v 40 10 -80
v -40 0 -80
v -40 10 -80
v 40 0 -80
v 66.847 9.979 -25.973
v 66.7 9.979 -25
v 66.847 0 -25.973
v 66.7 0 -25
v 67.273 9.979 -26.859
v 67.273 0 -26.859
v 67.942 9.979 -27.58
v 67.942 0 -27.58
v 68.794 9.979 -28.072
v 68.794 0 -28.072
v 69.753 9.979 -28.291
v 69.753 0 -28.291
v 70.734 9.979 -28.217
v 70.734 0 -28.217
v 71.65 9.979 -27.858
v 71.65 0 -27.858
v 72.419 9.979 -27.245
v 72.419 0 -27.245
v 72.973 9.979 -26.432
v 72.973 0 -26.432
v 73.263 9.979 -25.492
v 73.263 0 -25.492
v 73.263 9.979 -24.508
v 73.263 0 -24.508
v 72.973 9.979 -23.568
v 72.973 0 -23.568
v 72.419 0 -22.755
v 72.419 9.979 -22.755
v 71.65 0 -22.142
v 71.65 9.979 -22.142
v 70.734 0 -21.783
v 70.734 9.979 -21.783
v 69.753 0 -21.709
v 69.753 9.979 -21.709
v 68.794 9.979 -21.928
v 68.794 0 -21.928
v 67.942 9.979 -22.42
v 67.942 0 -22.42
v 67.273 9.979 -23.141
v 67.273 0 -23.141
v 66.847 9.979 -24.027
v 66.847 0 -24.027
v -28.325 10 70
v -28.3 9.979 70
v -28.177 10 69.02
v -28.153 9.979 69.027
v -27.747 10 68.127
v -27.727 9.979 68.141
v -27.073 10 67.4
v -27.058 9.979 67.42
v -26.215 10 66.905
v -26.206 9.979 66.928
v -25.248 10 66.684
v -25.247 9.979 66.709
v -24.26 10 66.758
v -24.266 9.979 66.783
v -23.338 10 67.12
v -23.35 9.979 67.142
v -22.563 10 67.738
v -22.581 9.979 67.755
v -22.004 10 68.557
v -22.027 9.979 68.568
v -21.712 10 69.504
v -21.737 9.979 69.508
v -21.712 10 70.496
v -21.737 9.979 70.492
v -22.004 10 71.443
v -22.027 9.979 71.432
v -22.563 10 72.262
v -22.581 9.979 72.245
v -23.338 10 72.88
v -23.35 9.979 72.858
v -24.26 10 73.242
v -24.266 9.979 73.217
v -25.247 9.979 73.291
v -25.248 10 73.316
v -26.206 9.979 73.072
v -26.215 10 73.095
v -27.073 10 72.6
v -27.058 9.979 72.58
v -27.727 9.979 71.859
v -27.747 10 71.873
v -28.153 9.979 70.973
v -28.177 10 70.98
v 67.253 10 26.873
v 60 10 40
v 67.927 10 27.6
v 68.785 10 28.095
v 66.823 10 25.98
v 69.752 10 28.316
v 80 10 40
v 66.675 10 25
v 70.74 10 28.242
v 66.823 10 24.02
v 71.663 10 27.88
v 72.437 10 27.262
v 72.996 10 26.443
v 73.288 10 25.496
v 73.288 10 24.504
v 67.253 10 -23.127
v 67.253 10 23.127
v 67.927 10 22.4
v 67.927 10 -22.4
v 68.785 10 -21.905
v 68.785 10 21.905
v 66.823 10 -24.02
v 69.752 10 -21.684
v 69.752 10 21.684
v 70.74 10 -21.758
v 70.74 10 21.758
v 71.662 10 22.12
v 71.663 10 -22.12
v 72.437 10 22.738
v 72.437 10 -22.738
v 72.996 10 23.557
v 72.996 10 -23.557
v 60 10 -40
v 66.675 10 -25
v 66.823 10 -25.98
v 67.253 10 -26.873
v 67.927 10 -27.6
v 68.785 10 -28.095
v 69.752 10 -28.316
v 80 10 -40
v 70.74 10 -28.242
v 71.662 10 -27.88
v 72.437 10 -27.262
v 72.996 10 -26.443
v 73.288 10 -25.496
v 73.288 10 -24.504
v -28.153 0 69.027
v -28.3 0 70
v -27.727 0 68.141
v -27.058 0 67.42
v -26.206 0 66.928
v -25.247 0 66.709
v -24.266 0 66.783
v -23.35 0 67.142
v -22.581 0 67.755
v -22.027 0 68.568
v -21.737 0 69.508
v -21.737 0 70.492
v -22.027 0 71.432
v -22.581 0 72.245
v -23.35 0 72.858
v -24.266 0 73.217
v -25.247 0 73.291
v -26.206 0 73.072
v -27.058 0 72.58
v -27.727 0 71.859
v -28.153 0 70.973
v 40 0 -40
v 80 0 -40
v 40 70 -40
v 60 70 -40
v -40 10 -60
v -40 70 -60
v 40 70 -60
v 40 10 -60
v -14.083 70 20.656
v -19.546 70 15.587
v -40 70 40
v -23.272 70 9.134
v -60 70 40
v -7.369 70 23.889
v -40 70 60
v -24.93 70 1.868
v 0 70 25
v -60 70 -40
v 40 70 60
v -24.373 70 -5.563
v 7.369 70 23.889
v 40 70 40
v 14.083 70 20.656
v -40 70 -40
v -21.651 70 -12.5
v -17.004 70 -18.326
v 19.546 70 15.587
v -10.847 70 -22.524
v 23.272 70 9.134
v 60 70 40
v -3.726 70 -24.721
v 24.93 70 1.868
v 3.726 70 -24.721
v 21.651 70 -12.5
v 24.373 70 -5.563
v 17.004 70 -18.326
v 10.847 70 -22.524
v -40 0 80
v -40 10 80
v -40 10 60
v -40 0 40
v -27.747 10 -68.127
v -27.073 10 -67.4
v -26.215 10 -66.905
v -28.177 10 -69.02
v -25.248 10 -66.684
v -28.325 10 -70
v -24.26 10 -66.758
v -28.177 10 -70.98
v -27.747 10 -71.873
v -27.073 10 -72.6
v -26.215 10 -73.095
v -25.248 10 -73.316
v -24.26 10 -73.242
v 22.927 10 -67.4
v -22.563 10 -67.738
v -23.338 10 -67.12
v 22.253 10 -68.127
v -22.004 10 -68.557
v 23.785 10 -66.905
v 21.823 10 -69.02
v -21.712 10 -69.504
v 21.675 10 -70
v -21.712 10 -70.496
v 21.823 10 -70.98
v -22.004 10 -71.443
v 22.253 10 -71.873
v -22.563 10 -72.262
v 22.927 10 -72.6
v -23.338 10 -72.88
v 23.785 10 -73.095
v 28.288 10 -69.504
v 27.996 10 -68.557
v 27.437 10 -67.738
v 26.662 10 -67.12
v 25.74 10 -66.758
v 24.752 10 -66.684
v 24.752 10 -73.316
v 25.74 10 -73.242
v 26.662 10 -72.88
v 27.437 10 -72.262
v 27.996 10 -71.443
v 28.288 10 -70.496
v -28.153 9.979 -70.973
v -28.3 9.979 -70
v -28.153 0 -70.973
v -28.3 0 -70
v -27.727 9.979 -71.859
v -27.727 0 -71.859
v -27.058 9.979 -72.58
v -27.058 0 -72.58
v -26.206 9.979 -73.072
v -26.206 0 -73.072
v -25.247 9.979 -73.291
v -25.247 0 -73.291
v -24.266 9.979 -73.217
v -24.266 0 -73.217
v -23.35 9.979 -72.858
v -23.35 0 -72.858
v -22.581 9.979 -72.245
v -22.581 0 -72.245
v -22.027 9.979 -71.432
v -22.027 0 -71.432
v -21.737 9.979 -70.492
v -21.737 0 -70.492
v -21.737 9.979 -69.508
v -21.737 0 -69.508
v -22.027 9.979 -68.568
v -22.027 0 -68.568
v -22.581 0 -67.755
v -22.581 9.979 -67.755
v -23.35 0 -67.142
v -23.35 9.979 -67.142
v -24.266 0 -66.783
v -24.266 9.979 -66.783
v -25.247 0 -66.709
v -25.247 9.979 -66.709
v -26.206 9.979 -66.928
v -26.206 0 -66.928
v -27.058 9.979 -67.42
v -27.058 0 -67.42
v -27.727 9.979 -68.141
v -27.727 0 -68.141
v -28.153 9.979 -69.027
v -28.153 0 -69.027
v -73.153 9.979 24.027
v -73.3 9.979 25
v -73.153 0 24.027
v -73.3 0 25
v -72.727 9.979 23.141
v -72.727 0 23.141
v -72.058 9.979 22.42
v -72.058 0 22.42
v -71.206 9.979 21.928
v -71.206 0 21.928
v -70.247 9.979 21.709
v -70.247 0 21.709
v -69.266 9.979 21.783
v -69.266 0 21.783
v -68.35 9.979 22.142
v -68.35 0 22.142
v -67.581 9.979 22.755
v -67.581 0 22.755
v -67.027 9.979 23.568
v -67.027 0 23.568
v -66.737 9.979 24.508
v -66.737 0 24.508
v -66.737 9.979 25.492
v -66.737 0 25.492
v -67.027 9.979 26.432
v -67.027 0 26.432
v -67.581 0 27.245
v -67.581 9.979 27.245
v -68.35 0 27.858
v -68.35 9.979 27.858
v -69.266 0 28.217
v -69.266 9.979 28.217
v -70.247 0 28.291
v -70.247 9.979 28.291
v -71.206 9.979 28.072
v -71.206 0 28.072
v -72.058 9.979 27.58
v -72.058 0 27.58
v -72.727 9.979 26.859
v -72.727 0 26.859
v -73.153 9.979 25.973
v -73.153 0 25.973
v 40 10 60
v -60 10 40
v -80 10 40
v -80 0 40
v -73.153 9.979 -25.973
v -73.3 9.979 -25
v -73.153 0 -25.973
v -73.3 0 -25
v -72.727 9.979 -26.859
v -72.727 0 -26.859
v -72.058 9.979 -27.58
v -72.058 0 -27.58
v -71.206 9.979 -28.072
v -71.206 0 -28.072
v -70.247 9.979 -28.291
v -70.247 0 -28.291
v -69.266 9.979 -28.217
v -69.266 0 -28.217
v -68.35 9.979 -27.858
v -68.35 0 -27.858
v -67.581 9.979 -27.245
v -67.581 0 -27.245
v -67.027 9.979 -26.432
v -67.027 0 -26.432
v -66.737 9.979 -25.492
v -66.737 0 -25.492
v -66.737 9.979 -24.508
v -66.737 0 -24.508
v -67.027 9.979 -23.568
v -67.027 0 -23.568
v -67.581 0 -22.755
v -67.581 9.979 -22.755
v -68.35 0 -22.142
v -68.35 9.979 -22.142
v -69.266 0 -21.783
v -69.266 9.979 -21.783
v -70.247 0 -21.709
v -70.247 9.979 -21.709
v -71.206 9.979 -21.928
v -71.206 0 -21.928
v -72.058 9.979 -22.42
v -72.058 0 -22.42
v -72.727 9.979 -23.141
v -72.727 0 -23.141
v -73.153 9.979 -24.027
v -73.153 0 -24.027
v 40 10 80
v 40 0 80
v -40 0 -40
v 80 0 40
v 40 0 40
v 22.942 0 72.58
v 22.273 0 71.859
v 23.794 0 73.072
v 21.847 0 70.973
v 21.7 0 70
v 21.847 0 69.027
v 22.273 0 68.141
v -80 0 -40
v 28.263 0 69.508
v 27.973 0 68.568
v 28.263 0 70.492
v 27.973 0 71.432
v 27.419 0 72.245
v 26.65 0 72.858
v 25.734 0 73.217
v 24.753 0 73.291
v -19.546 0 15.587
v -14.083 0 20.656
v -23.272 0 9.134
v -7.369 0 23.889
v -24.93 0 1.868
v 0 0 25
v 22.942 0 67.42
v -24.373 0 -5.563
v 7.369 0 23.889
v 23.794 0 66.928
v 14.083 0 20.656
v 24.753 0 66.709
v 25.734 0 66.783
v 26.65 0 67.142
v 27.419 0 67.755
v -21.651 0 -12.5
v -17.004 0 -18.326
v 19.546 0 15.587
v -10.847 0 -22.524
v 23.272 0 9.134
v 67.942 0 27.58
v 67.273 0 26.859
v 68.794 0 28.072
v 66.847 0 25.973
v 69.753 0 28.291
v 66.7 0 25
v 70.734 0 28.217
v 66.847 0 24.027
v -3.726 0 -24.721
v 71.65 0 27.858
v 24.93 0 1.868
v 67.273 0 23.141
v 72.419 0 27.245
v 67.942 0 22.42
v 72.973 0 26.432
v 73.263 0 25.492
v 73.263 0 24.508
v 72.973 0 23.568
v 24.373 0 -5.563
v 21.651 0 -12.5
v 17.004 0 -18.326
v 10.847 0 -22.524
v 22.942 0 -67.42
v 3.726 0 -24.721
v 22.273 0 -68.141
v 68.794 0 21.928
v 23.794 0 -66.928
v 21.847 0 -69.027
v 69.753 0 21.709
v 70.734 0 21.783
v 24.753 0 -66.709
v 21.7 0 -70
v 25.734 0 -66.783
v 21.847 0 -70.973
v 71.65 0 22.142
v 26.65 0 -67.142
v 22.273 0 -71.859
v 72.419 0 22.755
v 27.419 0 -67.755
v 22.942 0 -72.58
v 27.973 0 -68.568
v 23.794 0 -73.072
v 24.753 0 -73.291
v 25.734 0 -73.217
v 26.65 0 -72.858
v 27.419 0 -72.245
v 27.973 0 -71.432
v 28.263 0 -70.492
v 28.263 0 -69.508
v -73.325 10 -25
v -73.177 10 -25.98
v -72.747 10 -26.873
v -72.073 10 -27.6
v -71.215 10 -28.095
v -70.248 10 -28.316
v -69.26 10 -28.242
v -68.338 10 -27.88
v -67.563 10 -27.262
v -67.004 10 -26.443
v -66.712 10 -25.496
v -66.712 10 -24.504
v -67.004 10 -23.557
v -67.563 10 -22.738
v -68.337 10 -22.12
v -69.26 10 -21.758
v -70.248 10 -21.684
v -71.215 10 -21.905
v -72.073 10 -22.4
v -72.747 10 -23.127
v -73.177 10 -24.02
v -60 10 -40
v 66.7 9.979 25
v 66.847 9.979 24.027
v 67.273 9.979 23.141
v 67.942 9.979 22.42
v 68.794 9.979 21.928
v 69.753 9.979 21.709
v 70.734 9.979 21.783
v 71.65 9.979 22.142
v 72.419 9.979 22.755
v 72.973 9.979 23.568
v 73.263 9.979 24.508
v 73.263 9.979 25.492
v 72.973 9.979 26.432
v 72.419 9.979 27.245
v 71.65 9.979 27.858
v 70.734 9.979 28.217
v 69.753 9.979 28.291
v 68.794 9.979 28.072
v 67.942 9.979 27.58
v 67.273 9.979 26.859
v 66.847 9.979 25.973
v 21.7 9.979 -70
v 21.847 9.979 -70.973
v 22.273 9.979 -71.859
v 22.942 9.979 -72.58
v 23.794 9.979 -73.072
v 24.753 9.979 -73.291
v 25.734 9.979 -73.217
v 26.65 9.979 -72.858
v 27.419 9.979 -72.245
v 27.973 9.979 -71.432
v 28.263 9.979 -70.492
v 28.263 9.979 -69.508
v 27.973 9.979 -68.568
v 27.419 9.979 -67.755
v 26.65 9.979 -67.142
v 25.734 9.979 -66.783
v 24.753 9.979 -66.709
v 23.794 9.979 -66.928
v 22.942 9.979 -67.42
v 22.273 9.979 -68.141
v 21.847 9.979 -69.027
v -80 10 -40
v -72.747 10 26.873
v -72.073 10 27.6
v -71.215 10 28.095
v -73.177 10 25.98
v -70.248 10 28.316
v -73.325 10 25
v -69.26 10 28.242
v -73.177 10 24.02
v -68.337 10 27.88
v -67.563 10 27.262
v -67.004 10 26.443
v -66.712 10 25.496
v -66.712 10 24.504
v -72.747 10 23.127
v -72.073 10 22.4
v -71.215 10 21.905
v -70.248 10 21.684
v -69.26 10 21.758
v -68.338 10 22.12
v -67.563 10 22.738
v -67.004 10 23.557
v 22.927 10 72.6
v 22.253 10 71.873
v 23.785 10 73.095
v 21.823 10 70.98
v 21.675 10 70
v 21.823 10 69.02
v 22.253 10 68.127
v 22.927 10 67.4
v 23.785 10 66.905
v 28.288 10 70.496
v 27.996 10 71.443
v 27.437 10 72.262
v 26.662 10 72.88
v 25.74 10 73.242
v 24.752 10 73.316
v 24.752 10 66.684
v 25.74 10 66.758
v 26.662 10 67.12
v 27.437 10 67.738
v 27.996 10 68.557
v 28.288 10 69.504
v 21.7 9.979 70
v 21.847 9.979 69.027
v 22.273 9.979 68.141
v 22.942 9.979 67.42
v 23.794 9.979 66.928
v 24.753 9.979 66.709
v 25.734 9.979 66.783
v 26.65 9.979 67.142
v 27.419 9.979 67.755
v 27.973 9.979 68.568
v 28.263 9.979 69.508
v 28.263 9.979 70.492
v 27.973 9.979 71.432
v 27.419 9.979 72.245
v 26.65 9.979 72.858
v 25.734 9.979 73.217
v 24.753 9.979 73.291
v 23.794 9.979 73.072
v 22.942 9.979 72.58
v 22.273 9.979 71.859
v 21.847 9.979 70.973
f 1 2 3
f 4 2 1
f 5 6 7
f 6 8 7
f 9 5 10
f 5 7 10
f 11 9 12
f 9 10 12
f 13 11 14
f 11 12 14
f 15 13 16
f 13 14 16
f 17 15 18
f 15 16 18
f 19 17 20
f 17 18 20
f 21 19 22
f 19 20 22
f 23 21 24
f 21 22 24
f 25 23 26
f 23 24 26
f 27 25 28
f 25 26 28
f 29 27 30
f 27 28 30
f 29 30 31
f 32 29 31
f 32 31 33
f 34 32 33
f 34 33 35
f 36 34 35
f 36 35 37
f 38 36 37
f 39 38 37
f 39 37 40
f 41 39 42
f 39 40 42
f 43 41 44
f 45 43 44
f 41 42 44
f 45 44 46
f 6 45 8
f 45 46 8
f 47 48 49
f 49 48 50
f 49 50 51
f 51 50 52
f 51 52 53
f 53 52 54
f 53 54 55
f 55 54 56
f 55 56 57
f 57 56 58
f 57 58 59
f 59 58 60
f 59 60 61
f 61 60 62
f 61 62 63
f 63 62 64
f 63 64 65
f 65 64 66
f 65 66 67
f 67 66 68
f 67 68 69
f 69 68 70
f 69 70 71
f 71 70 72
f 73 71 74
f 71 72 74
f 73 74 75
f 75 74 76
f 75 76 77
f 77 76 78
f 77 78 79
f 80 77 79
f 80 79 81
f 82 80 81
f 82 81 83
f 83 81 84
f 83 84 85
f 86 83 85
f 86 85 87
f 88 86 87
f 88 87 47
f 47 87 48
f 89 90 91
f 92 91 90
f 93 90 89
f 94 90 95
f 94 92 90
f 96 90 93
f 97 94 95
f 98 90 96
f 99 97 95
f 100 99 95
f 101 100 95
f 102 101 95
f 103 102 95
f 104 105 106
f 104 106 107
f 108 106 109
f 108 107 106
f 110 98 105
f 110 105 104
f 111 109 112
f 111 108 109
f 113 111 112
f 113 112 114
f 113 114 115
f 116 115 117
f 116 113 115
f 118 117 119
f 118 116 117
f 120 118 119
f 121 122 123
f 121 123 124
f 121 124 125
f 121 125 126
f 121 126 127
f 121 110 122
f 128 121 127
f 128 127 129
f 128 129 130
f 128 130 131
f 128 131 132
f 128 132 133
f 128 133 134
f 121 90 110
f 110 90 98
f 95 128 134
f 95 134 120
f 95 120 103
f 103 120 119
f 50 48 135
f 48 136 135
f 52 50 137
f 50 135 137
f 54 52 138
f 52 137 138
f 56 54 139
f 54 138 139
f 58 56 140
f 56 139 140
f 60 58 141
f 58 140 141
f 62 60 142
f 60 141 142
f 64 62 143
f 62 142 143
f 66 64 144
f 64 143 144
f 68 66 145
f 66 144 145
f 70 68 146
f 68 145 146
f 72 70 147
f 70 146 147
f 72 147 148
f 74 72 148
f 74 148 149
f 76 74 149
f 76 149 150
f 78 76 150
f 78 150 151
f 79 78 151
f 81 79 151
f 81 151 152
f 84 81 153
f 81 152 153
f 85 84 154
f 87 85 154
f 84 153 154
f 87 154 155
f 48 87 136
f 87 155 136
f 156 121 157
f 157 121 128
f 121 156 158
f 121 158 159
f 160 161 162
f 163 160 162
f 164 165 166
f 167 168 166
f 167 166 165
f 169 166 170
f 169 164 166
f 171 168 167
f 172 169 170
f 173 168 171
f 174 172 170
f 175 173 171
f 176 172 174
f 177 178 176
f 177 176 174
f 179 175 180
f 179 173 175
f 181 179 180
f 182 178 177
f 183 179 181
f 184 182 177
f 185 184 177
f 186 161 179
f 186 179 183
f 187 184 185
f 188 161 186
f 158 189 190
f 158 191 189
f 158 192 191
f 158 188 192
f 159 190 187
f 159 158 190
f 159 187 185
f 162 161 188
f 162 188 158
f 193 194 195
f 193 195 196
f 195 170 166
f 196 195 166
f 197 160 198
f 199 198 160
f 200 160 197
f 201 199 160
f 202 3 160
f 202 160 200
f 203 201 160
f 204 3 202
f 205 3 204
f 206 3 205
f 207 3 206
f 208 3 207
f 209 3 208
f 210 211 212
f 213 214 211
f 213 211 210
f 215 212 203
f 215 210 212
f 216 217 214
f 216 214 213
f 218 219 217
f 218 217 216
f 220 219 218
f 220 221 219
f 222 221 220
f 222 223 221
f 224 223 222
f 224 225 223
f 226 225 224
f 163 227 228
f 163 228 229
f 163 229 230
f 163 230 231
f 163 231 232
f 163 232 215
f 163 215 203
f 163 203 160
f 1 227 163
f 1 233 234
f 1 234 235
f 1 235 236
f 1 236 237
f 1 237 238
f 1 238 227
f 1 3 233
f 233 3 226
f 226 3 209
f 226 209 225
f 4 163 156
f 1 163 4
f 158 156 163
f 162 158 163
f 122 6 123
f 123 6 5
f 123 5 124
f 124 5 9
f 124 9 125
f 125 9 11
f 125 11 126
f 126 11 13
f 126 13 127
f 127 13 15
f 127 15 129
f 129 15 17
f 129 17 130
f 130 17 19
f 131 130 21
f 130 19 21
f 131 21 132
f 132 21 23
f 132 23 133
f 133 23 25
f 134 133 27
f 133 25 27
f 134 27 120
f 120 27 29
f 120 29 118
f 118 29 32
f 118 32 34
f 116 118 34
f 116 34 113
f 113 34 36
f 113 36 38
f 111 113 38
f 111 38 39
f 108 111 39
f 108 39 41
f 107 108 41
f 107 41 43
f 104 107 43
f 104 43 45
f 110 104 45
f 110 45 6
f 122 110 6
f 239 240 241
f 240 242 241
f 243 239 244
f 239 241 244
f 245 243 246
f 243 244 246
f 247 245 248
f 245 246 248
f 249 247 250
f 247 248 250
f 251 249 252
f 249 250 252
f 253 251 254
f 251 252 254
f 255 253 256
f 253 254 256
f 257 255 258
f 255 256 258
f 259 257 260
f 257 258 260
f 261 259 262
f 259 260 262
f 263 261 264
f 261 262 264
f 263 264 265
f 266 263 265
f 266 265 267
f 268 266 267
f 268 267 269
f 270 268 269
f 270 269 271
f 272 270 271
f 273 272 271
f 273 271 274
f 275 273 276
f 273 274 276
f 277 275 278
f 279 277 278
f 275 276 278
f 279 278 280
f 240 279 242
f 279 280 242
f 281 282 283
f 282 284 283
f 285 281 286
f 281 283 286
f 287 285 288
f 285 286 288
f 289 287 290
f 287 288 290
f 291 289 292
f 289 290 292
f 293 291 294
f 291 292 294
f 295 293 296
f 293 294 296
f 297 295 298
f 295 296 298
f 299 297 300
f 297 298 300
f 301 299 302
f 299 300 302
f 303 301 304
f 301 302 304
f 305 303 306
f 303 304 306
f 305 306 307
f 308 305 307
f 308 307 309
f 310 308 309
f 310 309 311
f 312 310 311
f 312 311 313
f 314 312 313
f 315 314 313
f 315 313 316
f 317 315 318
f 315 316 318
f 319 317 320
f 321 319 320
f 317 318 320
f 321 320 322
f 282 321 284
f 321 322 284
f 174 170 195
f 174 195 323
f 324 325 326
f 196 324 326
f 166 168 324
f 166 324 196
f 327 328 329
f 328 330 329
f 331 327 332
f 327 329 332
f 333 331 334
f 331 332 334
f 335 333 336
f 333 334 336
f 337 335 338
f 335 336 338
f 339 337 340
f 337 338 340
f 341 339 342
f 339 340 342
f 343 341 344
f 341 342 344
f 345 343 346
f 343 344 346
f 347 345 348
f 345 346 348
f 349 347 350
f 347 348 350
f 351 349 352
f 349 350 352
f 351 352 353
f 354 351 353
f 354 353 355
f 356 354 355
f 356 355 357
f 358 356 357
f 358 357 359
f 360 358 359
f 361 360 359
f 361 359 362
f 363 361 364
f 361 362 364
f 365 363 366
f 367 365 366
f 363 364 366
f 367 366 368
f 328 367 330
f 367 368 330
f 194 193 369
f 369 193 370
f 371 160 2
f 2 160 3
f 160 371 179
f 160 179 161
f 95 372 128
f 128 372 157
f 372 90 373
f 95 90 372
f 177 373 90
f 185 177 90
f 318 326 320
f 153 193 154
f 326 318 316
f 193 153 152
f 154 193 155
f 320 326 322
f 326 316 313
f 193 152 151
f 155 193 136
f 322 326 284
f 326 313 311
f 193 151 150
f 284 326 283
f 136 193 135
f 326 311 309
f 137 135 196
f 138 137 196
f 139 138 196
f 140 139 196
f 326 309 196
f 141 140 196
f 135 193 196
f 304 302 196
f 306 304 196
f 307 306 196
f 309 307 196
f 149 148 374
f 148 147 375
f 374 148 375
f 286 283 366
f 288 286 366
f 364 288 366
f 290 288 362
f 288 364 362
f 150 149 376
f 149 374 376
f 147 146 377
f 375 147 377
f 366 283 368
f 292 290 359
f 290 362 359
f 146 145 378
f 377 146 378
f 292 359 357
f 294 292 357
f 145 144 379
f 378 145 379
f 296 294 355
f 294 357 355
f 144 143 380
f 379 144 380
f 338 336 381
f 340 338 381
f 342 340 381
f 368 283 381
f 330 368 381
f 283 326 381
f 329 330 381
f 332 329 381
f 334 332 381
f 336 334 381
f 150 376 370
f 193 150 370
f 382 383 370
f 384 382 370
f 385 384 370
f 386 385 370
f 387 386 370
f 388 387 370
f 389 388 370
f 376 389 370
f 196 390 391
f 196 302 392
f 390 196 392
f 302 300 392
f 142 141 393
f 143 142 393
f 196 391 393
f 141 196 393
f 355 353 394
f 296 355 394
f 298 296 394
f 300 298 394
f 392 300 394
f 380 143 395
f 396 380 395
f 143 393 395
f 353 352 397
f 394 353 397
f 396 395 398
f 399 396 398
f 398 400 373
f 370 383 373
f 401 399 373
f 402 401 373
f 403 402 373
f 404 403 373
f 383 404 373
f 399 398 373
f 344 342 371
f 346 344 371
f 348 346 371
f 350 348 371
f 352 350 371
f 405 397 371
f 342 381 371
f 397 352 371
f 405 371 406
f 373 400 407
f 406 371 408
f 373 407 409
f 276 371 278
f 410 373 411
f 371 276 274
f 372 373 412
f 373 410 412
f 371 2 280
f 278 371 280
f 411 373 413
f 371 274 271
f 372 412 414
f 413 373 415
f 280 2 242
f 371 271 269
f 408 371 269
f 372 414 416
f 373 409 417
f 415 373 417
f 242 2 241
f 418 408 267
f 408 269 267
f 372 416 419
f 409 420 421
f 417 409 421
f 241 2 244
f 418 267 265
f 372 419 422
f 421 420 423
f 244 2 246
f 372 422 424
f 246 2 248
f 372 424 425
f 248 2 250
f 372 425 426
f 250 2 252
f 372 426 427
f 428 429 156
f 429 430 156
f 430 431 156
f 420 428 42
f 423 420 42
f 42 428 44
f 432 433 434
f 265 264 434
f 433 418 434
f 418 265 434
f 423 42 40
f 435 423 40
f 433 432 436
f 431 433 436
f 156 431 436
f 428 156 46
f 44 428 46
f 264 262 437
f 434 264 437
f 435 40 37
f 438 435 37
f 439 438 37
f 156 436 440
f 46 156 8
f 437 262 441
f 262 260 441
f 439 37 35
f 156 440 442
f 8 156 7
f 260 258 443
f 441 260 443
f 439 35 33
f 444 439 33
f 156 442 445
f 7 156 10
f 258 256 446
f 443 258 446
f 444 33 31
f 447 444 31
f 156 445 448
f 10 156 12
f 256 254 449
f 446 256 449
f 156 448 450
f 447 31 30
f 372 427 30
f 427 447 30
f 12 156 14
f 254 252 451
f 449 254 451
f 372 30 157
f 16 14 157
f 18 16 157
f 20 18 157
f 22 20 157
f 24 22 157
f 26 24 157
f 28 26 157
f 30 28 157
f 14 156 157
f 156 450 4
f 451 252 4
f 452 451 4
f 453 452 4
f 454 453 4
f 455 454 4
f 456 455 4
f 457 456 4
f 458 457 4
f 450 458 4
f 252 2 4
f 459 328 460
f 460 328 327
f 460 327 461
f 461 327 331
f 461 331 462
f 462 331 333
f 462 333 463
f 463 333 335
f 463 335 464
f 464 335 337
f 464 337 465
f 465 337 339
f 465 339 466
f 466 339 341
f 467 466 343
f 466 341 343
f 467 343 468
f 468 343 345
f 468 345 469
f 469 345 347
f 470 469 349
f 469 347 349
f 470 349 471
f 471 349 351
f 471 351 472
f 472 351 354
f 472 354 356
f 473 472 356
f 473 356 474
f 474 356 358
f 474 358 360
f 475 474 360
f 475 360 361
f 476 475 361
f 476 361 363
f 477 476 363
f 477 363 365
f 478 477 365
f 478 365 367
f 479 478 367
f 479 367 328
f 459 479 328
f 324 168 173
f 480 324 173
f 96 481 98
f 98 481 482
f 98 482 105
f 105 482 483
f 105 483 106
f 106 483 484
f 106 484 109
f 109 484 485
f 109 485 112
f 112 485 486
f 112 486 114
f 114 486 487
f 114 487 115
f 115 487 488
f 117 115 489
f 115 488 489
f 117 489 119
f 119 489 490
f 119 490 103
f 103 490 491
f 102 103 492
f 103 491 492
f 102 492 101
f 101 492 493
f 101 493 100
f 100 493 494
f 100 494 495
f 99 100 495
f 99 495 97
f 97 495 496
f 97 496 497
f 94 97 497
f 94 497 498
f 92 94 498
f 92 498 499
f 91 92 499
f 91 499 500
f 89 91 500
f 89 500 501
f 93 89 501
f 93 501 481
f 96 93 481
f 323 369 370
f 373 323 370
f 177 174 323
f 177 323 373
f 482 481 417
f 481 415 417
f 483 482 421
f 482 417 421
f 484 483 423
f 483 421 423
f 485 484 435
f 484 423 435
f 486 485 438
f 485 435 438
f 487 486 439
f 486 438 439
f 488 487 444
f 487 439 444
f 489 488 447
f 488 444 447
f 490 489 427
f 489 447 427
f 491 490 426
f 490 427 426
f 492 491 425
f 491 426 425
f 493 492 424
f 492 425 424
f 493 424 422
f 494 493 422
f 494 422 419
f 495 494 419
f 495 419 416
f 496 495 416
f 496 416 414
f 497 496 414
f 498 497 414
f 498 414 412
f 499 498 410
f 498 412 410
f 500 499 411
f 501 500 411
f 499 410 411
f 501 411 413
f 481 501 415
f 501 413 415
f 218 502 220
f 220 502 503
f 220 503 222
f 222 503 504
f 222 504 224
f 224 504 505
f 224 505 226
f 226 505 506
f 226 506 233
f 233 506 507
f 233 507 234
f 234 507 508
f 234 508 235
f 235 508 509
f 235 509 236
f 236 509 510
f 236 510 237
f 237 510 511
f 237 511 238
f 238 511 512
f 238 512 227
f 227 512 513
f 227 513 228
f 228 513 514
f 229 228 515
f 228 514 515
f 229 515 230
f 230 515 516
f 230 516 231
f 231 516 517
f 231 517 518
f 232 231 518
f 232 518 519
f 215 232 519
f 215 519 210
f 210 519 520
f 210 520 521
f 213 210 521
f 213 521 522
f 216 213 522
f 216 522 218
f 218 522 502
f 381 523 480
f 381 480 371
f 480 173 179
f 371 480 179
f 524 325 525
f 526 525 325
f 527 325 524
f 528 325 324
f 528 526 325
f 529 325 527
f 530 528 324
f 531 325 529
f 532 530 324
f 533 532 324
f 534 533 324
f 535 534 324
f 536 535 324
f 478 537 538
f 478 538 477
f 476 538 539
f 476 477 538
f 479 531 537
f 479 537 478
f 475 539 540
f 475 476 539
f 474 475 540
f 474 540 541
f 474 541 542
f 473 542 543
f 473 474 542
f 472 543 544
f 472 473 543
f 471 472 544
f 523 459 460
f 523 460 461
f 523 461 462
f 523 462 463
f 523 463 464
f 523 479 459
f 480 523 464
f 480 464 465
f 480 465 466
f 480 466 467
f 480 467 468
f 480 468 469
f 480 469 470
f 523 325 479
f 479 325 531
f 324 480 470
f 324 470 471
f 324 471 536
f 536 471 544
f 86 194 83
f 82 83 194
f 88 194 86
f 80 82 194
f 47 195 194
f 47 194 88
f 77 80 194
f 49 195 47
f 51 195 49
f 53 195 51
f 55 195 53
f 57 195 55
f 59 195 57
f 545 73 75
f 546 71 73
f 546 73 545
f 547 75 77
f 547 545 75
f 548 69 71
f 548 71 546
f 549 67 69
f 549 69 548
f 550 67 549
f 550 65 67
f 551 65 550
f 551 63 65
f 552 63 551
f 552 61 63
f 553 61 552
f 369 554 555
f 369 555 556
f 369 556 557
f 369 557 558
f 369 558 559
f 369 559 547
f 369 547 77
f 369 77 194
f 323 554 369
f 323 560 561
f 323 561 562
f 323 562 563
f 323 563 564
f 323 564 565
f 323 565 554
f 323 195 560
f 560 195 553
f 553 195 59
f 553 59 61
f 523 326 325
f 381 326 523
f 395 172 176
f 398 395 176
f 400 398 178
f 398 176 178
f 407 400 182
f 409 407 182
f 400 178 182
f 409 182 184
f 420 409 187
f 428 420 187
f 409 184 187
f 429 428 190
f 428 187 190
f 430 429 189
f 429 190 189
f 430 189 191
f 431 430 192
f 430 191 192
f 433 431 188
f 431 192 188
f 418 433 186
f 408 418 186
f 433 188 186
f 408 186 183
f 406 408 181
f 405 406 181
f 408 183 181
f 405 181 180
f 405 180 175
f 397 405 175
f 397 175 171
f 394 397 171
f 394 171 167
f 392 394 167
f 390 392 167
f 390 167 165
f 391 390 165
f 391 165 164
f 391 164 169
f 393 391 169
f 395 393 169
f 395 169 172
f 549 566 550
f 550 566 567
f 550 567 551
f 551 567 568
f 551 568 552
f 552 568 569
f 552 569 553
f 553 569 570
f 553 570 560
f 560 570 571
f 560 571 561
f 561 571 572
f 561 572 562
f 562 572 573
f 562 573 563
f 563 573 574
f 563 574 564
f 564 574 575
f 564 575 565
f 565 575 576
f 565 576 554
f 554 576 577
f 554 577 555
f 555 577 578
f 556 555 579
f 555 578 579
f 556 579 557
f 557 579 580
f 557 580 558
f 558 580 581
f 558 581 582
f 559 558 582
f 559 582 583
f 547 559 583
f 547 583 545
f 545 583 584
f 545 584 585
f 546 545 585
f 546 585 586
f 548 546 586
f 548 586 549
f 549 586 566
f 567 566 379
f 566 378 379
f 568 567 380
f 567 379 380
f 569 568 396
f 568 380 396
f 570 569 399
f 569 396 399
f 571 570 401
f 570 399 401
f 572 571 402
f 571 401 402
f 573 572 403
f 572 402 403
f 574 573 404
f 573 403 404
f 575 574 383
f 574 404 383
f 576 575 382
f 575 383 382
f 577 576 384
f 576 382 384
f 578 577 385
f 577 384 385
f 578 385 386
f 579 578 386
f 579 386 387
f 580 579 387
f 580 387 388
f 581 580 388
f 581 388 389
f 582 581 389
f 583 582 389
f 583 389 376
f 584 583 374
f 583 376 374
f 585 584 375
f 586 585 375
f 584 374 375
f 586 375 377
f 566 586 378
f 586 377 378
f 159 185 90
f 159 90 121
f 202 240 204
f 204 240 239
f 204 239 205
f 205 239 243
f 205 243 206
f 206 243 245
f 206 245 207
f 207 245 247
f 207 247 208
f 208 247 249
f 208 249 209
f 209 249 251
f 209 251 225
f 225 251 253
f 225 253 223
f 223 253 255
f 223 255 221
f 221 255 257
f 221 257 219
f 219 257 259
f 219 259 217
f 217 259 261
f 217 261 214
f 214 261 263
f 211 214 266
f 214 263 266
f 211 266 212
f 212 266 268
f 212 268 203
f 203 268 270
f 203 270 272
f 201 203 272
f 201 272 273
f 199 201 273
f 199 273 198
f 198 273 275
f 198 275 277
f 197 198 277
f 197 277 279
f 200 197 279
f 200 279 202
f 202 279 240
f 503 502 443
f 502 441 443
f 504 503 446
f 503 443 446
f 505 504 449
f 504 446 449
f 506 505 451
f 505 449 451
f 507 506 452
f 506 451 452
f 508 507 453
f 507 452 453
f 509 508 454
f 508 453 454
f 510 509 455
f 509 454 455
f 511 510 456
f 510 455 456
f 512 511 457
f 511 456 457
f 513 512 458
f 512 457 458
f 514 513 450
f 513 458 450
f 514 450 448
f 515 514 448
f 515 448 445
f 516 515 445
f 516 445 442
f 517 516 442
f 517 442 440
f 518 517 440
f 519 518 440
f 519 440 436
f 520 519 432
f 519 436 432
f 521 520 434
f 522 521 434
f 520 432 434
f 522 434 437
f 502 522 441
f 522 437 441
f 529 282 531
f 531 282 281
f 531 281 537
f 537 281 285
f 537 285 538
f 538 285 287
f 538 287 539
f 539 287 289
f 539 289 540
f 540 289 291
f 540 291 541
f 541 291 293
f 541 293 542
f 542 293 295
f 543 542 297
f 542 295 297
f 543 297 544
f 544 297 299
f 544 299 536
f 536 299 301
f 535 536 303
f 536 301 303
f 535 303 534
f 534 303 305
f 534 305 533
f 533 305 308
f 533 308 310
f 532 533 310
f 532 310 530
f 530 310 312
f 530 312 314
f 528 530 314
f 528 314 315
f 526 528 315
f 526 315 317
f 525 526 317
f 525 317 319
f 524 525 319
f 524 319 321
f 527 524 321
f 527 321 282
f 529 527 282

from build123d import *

# Parameters (mm, degrees)
SKETCH1_W                      = 160
SKETCH1_H                      = 160
BOSS_EXTRUDE1_DEPTH            = 70
SKETCH2_W                      = 40
SKETCH2_H                      = 40
CUT_EXTRUDE1_DEPTH             = 134.041346957
SKETCH3_W                      = 80
SKETCH3_H                      = 20
SKETCH3_W_2                    = 20
SKETCH3_H_2                    = 80
CUT_EXTRUDE2_DEPTH             = 60
CUT_EXTRUDE3_REACH             = 135.041
SKETCH4_R                      = 25
M6_CLEARANCE_HOLE1_D           = 6.6
M6_CLEARANCE_HOLE1_CSINK_D     = 6.65
M6_CLEARANCE_HOLE1_CSINK_ANGLE = 100


with BuildPart() as part:
    # Sketch1 → Boss-Extrude1 (new body)
    with BuildSketch(Plane(origin=(0, 0, 0), x_dir=(1, 0, 0), z_dir=(0, 1, 0))):
        Rectangle(SKETCH1_W, SKETCH1_H)
    extrude(amount=BOSS_EXTRUDE1_DEPTH)

    # Sketch2 → Cut-Extrude1 (cut, through all)
    with BuildSketch(Plane(origin=(0, 70, 0), x_dir=(1, 0, 0), z_dir=(0, 1, 0))):
        with Locations((-60, 60)):
            Rectangle(SKETCH2_W, SKETCH2_H)
        with Locations((60, 60)):
            Rectangle(SKETCH2_W, SKETCH2_H)
        with Locations((-60, -60)):
            Rectangle(SKETCH2_W, SKETCH2_H)
        with Locations((60, -60)):
            Rectangle(SKETCH2_W, SKETCH2_H)
    extrude(amount=-CUT_EXTRUDE1_DEPTH, mode=Mode.SUBTRACT)

    # Sketch3 → Cut-Extrude2 (cut)
    with BuildSketch(Plane(origin=(0, 70, 0), x_dir=(1, 0, 0), z_dir=(0, 1, 0))):
        with Locations((0, 70)):
            Rectangle(SKETCH3_W, SKETCH3_H)
        with Locations((-70, 0)):
            Rectangle(SKETCH3_W_2, SKETCH3_H_2)
        with Locations((70, 0)):
            Rectangle(SKETCH3_W_2, SKETCH3_H_2)
        with Locations((0, -70)):
            Rectangle(SKETCH3_W, SKETCH3_H)
    extrude(amount=-CUT_EXTRUDE2_DEPTH, mode=Mode.SUBTRACT)

    # Sketch4 → Cut-Extrude3 (cut, up to next)
    with BuildSketch(Plane(origin=(0, 70, 0), x_dir=(1, 0, 0), z_dir=(0, 1, 0)), mode=Mode.PRIVATE) as cut_extrude3_sk1:
        with Locations(Location((0, 0, 0), (0, 0, 270))):
            Circle(SKETCH4_R)
    cut_extrude3_tool1 = extrude(cut_extrude3_sk1.sketch, amount=-CUT_EXTRUDE3_REACH, mode=Mode.PRIVATE) & part.part
    add(cut_extrude3_tool1.solids().sort_by_distance((0, 70, 0))[0], mode=Mode.SUBTRACT)

    # M6 Clearance Hole1 (through all)
    with Locations(Plane(origin=(0, 10, 0), x_dir=(1, 0, 0), z_dir=(0, 1, 0))):
        with Locations((-70, 25), (-70, -25), (-25, 70), (25, 70), (70, 25), (70, -25), (25, -70), (-25, -70)):
            CounterSinkHole(M6_CLEARANCE_HOLE1_D / 2, M6_CLEARANCE_HOLE1_CSINK_D / 2, counter_sink_angle=M6_CLEARANCE_HOLE1_CSINK_ANGLE)


solid = part.part
